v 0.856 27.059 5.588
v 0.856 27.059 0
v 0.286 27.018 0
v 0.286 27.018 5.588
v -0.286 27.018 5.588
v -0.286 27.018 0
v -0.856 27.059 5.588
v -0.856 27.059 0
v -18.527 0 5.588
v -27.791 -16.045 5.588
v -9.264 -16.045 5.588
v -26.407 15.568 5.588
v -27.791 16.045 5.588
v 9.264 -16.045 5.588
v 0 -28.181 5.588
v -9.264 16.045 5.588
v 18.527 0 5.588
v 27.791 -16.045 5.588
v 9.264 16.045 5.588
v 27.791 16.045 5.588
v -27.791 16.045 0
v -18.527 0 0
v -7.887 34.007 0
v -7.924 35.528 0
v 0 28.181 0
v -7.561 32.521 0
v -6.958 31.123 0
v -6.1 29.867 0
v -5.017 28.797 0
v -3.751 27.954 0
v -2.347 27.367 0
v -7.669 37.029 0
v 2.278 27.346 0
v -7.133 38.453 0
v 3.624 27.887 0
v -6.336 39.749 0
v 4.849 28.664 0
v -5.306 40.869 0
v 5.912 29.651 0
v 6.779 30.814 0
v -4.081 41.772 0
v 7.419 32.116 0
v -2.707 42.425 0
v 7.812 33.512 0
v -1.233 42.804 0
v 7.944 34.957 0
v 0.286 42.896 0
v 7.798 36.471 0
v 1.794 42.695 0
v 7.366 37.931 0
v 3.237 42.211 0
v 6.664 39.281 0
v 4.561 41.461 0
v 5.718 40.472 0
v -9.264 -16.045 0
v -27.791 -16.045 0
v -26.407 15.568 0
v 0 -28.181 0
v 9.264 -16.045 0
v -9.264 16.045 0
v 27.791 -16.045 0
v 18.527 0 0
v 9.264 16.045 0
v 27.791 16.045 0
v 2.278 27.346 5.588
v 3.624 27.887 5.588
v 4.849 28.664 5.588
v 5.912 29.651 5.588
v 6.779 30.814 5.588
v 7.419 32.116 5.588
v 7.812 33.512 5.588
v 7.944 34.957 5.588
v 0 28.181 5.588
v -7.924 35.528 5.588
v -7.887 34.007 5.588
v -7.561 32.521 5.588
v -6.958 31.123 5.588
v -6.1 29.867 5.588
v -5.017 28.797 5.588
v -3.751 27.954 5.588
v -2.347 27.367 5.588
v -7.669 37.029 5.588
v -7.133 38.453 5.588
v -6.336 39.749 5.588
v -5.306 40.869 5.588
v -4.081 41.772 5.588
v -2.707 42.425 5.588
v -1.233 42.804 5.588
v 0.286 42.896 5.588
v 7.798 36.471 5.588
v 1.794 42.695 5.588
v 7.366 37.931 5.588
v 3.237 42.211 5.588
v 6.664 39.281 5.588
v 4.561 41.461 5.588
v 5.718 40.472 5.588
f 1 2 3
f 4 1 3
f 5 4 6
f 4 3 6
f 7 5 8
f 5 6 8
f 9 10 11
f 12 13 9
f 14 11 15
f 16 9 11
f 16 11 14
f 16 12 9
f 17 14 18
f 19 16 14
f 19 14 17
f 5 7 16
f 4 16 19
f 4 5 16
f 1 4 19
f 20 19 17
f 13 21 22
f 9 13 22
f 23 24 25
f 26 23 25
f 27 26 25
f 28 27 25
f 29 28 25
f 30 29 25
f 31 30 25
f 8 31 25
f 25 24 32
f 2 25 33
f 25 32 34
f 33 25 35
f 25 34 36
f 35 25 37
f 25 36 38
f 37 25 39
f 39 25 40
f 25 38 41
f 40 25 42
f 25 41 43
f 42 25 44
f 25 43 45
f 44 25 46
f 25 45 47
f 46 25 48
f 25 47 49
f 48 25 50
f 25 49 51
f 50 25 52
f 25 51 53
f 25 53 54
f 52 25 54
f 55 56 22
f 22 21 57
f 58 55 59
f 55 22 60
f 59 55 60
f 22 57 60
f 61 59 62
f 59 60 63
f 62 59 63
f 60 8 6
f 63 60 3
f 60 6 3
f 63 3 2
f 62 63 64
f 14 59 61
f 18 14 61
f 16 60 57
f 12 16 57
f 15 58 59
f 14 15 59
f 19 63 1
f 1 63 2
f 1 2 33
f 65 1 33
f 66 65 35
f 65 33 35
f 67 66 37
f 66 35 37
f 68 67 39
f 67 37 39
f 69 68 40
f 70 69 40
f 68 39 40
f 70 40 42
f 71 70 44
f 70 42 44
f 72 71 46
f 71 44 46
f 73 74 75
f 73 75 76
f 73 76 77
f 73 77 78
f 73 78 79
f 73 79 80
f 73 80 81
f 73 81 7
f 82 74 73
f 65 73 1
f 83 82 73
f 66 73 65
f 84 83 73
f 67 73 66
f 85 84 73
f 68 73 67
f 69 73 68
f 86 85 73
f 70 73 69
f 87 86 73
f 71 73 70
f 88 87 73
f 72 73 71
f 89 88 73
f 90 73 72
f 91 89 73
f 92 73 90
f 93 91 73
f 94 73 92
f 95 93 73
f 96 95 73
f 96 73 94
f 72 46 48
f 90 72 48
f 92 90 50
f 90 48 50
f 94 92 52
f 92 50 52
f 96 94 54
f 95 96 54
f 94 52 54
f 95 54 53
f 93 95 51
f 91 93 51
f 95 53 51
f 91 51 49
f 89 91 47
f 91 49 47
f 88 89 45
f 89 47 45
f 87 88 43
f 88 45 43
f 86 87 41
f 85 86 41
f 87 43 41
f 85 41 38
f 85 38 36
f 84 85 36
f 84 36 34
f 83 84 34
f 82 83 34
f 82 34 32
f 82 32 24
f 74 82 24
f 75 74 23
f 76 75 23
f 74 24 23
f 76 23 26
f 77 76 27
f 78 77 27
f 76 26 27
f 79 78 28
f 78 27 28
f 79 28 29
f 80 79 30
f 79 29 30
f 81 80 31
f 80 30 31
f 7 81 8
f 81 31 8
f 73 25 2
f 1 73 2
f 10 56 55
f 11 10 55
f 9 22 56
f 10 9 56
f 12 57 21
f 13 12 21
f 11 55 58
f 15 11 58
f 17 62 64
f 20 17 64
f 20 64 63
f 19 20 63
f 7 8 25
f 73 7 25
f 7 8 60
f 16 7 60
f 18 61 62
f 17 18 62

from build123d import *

# Parameters (mm, degrees)
F1_DEPTH = 5.588


with BuildPart() as f1:
    # F0 (on Top) → F1 (new body)
    with BuildSketch(Plane.XY):
        Polygon((9.263644, 16.045102), (-9.263644, 16.045102), (-18.527288, 0), (-9.263644, -16.045102), (9.263644, -16.045102), (18.527288, 0), align=None)
        with BuildLine():
            Line((-0.856473, 27.058847), (-9.263644, 16.045102))
            Line((-9.263644, 16.045102), (9.263644, 16.045102))
            Line((9.263644, 16.045102), (0.856473, 27.058847))
            ThreePointArc((0.856473, 27.058847), (0, 27.012543), (-0.856473, 27.058847))
        make_face()
        Polygon((-18.527288, 0), (-9.263644, 16.045102), (-26.407242, 15.568449), (-27.790932, 16.045102), align=None)
        Polygon((-9.263644, -16.045102), (-18.527288, 0), (-27.790932, -16.045102), align=None)
        Polygon((9.263644, -16.045102), (-9.263644, -16.045102), (0, -28.180862), align=None)
        Polygon((27.790932, -16.045102), (18.527288, 0), (9.263644, -16.045102), align=None)
        Polygon((27.790932, 16.045102), (9.263644, 16.045102), (18.527288, 0), align=None)
        with BuildLine():
            ThreePointArc((7.944106, 34.956649), (-5.305889, 40.86904), (-0.856473, 27.058847))
            Line((-0.856473, 27.058847), (0, 28.180862))
            Line((0, 28.180862), (0.856473, 27.058847))
            ThreePointArc((0.856473, 27.058847), (5.912391, 29.65076), (7.944106, 34.956649))
        make_face()
    extrude(amount=F1_DEPTH)


solid = f1.part
